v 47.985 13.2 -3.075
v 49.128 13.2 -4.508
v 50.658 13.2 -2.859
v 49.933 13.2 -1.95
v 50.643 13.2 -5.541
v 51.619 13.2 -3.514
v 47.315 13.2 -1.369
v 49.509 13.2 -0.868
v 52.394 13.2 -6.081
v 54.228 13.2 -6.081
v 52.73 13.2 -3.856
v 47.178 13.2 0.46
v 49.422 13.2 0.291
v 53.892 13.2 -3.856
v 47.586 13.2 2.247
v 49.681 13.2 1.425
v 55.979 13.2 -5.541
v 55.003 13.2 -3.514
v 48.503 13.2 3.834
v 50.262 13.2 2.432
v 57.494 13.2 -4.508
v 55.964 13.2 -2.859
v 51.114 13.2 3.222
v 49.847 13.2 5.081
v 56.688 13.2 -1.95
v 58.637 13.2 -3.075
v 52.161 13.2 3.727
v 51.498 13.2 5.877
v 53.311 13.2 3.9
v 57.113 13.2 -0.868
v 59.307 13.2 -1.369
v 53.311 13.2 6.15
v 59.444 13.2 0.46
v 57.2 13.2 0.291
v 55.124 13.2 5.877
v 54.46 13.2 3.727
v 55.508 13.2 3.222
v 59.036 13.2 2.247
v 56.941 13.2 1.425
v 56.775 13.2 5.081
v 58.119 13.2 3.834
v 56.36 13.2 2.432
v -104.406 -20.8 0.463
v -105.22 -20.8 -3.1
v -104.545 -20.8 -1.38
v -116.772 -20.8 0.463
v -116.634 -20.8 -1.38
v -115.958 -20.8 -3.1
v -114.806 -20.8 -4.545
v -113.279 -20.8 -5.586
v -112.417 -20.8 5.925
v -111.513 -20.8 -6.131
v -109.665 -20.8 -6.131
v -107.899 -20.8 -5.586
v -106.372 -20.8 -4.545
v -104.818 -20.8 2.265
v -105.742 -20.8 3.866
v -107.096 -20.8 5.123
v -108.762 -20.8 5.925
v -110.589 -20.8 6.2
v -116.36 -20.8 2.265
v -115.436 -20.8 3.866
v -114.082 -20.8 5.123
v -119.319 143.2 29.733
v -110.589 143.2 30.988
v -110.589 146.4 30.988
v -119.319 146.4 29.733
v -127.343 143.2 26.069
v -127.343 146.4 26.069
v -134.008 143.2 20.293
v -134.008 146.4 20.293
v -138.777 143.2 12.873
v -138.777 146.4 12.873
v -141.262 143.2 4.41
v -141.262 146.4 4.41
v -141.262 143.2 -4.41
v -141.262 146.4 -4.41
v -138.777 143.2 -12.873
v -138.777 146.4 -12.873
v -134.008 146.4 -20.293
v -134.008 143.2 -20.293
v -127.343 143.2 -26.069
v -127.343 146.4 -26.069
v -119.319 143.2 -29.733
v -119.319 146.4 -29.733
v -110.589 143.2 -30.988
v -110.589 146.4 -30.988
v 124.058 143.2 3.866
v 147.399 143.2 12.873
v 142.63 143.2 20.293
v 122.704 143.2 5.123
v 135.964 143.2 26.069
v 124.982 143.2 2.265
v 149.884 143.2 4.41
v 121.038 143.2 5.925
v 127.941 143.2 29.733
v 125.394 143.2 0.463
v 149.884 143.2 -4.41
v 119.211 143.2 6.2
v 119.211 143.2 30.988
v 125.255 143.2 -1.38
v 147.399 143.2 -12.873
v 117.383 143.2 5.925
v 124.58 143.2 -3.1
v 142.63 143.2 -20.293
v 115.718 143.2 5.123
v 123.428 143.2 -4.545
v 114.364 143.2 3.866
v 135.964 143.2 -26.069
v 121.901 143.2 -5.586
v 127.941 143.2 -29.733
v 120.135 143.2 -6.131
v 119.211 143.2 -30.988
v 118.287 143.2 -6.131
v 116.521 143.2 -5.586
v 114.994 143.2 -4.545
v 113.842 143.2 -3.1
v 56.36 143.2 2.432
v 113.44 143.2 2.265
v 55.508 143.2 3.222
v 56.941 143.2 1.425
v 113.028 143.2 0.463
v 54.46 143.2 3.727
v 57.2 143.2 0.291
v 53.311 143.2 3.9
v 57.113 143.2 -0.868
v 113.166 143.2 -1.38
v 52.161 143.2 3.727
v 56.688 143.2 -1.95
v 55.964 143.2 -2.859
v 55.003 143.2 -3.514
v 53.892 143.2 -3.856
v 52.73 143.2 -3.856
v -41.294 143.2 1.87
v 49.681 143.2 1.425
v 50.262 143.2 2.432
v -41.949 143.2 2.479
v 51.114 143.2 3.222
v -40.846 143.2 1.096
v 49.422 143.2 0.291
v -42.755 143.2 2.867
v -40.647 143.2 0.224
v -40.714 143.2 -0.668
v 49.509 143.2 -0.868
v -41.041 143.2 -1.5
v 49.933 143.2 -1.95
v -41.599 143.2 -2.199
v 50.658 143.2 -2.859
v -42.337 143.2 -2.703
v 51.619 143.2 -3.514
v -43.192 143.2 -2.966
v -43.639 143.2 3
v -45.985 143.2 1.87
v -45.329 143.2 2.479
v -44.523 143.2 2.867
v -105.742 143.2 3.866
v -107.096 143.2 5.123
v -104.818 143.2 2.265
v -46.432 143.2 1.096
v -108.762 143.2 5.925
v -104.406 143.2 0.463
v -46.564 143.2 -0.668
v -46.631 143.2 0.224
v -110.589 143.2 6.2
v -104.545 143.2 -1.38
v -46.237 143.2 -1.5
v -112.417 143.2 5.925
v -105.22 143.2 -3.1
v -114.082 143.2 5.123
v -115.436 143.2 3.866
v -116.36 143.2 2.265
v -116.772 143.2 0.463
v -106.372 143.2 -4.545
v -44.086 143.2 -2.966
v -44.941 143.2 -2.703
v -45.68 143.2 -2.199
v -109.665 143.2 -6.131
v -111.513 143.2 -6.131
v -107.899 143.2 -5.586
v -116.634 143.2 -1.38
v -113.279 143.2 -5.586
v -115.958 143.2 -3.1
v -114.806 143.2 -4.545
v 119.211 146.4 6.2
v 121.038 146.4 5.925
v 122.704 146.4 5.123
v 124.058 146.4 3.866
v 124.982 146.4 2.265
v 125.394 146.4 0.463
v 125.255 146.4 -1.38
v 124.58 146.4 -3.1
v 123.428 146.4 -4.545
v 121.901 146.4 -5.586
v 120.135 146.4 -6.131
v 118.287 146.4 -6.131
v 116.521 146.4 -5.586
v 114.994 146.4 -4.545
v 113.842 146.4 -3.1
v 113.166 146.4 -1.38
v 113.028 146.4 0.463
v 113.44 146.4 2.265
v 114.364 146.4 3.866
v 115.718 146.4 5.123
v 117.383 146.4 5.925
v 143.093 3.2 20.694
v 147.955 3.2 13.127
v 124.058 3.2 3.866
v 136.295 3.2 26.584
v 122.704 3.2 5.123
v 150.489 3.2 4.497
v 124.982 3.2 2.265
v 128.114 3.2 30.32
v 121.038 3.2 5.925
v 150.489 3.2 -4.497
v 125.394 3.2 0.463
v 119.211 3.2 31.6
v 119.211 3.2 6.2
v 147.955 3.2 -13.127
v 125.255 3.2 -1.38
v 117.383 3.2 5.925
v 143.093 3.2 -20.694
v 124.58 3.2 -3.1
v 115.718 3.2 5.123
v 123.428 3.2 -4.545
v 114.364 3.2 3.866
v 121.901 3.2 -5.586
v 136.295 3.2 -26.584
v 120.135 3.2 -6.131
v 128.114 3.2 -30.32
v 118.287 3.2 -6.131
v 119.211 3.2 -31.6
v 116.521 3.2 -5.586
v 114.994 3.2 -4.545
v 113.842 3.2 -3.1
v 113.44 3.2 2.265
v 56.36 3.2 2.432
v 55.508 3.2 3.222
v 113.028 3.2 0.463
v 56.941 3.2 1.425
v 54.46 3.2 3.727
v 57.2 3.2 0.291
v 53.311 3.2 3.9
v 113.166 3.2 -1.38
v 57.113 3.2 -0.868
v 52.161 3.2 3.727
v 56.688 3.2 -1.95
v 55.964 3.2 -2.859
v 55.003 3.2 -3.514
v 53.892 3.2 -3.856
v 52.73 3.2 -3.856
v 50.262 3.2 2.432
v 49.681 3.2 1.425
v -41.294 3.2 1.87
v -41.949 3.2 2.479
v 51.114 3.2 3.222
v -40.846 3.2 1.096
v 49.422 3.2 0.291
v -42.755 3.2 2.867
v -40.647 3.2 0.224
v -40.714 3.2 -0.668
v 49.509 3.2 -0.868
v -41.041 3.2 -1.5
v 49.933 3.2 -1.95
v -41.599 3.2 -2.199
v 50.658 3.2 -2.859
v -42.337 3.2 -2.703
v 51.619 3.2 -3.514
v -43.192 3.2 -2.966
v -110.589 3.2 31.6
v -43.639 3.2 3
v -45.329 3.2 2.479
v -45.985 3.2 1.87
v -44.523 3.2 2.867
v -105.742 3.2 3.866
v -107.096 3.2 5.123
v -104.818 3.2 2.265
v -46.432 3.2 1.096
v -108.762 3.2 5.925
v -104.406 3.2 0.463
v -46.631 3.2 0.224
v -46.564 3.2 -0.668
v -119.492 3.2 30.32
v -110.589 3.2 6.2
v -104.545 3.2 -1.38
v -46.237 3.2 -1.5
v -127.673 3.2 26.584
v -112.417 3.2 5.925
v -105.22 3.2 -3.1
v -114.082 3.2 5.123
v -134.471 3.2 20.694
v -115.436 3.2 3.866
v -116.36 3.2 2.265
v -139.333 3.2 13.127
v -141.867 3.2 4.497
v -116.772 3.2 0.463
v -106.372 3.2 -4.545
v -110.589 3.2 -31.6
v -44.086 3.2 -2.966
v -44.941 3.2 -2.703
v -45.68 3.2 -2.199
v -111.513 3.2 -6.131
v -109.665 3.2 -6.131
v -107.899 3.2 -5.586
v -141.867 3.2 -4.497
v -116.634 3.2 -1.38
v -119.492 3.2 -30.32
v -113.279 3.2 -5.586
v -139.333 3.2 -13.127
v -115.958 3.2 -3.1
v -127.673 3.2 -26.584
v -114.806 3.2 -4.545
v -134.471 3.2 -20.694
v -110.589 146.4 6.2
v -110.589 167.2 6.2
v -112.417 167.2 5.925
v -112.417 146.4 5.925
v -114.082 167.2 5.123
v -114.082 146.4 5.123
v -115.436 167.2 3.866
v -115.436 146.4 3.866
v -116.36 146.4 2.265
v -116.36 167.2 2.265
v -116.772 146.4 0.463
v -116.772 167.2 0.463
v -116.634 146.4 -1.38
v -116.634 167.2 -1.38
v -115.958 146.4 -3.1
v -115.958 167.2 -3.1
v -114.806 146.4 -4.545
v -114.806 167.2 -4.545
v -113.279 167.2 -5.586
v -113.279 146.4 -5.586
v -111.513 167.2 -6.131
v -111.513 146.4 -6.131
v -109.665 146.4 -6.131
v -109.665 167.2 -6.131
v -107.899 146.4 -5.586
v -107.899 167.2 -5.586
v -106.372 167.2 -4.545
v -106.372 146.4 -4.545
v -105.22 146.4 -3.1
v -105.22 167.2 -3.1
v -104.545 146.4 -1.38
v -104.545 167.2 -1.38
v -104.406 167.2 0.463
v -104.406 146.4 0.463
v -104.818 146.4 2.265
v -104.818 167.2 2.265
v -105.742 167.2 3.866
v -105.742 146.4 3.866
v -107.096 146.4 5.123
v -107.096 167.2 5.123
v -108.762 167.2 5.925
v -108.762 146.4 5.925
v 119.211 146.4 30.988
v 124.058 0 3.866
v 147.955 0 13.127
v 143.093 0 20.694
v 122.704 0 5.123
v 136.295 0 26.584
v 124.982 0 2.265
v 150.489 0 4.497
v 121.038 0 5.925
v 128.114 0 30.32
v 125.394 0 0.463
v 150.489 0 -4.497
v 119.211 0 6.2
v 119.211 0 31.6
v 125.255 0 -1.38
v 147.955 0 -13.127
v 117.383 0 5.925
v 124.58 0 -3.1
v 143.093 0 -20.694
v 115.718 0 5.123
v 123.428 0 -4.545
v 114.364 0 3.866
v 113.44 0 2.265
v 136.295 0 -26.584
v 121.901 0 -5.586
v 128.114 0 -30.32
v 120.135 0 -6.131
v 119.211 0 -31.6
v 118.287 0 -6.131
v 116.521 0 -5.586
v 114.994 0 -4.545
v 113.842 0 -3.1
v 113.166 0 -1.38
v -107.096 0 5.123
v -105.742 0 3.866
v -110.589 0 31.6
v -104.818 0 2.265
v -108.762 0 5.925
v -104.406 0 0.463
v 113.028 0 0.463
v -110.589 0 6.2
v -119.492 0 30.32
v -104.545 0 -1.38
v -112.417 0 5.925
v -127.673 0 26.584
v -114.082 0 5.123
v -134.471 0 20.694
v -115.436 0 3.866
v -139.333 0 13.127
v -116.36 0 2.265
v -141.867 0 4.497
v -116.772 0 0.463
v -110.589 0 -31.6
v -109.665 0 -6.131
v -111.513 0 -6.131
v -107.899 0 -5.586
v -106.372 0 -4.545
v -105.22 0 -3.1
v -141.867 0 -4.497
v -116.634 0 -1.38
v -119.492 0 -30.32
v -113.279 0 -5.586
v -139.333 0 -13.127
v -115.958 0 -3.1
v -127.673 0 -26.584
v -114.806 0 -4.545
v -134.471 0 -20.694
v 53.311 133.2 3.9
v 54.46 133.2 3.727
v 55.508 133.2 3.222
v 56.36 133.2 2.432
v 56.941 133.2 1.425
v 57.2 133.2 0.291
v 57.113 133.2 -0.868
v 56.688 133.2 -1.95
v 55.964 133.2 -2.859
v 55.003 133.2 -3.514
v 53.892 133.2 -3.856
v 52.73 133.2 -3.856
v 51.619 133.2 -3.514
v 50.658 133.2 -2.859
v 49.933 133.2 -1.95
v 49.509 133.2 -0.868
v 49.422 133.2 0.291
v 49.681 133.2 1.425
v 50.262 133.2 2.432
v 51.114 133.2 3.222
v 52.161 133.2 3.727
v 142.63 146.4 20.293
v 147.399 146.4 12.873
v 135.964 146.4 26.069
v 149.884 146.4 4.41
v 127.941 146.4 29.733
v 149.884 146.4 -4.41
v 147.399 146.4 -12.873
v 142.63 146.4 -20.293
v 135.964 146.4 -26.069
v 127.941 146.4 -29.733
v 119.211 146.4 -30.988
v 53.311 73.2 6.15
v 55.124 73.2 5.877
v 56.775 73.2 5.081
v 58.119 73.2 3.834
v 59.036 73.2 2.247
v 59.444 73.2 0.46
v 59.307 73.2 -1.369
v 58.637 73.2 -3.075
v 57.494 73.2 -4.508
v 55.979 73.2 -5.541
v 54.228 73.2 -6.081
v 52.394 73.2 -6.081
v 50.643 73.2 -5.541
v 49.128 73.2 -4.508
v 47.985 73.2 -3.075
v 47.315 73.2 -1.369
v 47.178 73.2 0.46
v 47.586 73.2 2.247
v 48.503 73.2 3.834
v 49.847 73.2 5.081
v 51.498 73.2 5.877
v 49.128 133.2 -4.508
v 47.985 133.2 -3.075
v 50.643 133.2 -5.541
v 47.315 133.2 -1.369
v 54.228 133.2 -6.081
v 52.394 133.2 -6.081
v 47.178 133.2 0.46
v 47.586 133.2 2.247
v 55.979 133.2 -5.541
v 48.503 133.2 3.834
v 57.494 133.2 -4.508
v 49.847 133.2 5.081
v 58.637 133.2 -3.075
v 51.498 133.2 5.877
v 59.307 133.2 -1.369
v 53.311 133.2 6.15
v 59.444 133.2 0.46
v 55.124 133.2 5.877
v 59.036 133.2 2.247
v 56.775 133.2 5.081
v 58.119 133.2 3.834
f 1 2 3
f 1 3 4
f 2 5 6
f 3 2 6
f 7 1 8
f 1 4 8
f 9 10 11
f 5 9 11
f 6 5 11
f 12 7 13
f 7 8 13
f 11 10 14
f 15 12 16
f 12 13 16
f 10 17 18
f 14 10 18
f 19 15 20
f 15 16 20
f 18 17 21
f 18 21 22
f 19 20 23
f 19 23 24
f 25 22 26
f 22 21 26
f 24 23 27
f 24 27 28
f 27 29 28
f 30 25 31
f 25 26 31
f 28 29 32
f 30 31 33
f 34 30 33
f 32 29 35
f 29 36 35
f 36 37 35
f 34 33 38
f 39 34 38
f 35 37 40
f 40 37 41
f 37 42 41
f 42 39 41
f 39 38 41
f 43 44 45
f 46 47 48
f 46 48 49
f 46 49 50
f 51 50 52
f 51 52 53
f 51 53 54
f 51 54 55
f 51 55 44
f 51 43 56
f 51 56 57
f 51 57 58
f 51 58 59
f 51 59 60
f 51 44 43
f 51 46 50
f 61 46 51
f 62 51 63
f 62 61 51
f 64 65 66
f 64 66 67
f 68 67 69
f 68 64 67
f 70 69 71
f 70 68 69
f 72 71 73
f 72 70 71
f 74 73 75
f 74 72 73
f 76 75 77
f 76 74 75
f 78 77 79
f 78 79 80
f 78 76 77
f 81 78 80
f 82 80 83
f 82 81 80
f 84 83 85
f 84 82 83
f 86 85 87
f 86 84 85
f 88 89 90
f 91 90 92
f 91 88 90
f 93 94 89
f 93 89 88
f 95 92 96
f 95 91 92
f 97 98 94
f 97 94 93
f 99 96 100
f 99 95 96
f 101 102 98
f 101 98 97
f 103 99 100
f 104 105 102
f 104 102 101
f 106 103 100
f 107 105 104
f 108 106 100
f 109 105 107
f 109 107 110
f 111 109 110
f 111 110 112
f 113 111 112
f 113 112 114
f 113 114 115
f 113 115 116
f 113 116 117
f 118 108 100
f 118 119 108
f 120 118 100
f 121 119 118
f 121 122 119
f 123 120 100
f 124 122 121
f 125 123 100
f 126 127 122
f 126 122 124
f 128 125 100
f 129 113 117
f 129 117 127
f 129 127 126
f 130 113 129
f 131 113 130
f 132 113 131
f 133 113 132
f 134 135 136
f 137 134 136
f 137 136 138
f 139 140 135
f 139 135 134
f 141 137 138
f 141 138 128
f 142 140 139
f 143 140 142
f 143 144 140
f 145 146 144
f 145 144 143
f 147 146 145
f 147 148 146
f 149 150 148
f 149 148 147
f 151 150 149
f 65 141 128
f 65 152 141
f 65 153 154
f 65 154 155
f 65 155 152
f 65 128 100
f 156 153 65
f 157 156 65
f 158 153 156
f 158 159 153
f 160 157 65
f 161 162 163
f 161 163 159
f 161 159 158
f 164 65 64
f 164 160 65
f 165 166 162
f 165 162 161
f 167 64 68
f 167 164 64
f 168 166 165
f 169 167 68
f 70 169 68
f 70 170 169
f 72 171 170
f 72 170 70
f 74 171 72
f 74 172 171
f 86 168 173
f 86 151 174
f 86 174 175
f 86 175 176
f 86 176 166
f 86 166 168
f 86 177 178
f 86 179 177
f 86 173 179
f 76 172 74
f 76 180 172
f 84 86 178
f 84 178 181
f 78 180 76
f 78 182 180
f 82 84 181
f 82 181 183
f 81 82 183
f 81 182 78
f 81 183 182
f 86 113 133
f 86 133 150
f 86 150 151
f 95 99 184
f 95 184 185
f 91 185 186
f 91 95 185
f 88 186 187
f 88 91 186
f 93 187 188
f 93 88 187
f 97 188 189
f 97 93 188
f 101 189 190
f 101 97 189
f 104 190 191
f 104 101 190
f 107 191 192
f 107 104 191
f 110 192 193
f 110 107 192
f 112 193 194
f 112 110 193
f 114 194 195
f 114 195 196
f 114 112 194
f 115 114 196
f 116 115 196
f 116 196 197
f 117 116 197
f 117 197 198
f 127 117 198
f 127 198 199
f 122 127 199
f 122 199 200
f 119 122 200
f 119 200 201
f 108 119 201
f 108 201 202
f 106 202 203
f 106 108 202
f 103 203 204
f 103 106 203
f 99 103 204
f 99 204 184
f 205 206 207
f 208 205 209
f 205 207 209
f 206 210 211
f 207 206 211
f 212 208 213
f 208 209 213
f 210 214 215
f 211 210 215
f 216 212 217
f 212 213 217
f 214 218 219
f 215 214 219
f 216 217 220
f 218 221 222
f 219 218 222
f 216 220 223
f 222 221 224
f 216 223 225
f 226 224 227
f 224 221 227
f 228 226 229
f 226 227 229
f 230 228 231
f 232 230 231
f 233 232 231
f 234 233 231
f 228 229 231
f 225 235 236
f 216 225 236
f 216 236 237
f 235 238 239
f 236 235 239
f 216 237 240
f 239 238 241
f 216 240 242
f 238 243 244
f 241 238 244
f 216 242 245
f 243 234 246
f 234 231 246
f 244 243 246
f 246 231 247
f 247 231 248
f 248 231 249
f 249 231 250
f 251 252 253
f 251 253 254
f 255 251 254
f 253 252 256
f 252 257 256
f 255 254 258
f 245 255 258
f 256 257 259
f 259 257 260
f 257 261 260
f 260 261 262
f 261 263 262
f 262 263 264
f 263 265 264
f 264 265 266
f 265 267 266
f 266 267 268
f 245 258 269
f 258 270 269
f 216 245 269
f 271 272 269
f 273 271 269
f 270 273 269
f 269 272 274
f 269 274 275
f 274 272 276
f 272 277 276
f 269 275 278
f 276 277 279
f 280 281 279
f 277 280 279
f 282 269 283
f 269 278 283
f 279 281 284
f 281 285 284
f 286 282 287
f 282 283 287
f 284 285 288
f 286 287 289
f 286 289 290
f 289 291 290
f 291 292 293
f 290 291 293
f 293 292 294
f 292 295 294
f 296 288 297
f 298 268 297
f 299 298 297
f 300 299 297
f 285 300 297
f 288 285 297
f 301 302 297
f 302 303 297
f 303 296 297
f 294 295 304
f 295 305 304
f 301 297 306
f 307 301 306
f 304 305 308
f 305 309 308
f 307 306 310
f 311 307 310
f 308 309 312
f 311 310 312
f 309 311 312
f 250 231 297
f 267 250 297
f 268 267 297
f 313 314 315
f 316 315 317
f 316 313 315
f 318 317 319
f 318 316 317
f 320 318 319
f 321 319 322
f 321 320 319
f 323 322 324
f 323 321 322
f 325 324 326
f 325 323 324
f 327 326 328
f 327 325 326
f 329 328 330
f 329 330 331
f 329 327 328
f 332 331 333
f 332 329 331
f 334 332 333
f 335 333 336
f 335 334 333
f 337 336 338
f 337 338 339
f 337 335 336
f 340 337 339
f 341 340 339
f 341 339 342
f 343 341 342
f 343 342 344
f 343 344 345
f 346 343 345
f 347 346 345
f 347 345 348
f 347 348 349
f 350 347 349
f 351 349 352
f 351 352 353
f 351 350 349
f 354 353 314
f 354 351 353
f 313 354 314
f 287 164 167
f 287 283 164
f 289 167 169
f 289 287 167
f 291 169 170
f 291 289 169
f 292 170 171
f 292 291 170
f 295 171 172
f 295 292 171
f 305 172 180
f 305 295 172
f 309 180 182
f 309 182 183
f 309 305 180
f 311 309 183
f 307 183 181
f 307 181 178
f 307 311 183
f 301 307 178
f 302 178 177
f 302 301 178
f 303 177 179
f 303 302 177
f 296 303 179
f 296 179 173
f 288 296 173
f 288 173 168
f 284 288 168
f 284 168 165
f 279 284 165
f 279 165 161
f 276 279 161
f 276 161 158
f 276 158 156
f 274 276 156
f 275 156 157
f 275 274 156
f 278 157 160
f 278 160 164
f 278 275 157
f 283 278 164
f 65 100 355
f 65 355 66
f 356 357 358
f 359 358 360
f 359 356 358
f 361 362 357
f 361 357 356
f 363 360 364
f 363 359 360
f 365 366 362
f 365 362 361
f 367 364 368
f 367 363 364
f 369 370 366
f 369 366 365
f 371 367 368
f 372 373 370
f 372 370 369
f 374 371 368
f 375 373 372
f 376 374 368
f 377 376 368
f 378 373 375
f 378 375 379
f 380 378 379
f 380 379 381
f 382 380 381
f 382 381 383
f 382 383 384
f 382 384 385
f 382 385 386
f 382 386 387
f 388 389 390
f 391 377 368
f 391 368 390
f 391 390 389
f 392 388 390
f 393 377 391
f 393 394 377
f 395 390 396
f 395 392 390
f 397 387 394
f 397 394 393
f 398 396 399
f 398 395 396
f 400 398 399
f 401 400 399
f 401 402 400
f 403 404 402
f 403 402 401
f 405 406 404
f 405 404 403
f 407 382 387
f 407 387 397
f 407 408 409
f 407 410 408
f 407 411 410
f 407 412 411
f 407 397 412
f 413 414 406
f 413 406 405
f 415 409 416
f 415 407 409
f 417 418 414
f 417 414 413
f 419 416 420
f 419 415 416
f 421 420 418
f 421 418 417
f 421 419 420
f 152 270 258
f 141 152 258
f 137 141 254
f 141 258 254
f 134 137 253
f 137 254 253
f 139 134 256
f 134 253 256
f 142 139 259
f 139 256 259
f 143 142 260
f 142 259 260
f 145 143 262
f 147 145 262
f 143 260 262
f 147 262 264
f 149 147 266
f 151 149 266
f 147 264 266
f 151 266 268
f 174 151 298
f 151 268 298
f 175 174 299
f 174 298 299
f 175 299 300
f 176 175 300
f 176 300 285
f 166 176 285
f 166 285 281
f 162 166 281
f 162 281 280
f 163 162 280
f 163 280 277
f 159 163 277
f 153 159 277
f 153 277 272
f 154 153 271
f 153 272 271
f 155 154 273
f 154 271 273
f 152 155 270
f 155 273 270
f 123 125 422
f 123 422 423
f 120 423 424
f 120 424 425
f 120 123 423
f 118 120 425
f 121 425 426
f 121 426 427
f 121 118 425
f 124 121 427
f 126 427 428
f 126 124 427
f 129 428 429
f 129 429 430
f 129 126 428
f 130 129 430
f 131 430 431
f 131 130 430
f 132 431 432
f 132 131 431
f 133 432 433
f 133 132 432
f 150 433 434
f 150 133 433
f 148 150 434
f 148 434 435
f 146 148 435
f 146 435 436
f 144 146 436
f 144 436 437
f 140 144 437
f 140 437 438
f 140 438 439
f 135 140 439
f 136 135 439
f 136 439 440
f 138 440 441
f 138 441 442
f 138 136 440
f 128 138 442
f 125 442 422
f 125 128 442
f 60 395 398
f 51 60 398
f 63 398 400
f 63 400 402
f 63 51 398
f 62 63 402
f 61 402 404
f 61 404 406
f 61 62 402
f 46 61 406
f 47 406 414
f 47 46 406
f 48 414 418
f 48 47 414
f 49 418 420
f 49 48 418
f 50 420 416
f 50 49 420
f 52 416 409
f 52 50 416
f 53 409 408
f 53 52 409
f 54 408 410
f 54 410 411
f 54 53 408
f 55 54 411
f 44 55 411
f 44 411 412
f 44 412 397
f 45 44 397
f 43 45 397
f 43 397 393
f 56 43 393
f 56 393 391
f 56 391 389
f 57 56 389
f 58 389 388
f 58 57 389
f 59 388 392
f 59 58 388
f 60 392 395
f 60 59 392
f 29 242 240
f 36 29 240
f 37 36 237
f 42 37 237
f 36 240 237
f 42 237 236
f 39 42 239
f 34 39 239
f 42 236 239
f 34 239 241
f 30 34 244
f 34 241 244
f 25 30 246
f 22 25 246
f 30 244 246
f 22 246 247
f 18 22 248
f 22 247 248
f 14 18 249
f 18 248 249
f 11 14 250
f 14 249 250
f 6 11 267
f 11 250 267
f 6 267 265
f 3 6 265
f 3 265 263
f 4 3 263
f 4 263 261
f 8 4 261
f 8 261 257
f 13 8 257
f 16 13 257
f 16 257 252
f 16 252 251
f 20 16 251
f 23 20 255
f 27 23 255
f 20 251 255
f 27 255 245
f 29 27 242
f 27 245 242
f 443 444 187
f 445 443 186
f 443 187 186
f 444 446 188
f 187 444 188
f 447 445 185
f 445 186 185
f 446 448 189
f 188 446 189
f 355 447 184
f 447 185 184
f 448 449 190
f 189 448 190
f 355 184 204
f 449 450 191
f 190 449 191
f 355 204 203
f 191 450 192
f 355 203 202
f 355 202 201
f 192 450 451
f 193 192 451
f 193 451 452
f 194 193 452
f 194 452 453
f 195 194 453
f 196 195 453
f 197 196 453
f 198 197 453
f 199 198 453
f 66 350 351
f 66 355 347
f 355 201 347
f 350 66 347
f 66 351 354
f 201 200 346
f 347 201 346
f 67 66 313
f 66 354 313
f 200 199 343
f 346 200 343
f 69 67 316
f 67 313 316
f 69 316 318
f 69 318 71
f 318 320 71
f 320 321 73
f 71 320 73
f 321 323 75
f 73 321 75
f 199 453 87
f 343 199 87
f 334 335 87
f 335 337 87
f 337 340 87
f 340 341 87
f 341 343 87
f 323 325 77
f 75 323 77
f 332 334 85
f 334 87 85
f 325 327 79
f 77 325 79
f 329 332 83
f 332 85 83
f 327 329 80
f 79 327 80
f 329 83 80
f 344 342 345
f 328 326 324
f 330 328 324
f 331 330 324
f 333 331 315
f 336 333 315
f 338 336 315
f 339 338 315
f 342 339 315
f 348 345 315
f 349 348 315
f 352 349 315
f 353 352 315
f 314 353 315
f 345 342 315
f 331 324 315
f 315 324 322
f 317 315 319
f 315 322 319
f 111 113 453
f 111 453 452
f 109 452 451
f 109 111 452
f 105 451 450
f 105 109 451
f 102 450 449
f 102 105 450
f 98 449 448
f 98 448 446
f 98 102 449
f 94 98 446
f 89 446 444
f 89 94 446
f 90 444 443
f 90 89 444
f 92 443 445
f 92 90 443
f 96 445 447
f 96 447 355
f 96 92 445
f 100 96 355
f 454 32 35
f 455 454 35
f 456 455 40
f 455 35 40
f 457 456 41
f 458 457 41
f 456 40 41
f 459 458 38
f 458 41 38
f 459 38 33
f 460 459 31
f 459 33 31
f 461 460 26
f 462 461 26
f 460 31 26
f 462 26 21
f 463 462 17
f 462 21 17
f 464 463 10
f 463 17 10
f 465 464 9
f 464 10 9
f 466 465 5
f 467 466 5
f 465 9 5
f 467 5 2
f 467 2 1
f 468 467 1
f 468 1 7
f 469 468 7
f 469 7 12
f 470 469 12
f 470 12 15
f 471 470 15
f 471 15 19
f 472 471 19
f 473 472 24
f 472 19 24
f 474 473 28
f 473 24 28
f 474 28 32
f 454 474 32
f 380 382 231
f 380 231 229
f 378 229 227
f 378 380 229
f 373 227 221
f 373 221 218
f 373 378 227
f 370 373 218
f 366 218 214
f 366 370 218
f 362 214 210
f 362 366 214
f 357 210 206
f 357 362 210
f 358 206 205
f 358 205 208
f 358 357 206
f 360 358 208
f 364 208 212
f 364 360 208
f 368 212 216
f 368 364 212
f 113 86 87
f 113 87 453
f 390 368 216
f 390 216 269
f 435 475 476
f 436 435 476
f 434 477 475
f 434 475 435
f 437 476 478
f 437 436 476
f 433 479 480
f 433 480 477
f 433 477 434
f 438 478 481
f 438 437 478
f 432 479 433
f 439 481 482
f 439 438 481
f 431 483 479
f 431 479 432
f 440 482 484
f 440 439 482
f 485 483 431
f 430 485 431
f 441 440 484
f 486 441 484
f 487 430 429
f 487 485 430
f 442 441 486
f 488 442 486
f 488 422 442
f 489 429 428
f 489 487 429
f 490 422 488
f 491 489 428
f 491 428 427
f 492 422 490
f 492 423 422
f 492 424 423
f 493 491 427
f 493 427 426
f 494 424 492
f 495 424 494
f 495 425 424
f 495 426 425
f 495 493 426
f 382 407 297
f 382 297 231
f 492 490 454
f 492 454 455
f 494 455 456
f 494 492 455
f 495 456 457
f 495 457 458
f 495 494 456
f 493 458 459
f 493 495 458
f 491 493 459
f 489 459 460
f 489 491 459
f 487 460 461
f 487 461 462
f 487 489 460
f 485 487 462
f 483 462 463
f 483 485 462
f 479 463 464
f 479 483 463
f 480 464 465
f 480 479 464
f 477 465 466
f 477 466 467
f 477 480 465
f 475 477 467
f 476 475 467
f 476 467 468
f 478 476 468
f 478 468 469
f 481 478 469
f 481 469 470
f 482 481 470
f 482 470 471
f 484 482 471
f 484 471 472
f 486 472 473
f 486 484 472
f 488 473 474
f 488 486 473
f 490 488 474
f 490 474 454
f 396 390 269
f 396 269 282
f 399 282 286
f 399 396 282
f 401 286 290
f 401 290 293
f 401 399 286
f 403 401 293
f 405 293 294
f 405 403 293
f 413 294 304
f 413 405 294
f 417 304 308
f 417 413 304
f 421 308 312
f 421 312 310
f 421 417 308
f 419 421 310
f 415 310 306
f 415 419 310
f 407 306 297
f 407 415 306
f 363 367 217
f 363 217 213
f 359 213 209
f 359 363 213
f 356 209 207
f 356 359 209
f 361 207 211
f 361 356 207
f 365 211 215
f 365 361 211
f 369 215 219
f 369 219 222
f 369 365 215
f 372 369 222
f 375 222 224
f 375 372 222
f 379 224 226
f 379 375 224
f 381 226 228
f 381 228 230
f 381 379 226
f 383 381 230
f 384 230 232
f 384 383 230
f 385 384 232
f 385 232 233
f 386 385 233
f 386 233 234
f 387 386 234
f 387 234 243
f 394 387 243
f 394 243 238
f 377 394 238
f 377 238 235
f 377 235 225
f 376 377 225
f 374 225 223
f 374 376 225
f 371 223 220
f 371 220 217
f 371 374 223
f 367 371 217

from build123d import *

# Parameters (mm, degrees)
SKETCH1_R            = 6.2
BOSS_EXTRUDE1_DEPTH  = 3.2
SKETCH8_R            = 6.15
BOSS_EXTRUDE5_DEPTH  = 140
SKETCH11_R           = 6.2
BOSS_EXTRUDE6_DEPTH  = 3.2
SKETCH12_R           = 3
BOSS_EXTRUDE7_DEPTH  = 140
SKETCH14_R           = 3.9
BOSS_EXTRUDE8_DEPTH  = 10
SKETCH15_R           = 6.15
BOSS_EXTRUDE9_DEPTH  = 60
SKETCH16_R           = 6.2
BOSS_EXTRUDE10_DEPTH = 94


with BuildPart() as part:
    # Sketch1 → Boss-Extrude1 (new body)
    with BuildSketch(Plane(origin=(0, 0, 0), x_dir=(1, 0, 0), z_dir=(0, 1, 0))):
        with BuildLine():
            Line((-110.589063221, 31.6), (119.210936779, 31.6))
            ThreePointArc((119.210936779, 31.6), (150.810936779, 0), (119.210936779, -31.6))
            Line((119.210936779, -31.6), (-110.589063221, -31.6))
            ThreePointArc((-110.589063221, -31.6), (-142.189063221, 0), (-110.589063221, 31.6))
        make_face()
        with Locations(Location((119.210936779, 0, 0), (0, 0, 270))):
            Circle(SKETCH1_R, mode=Mode.SUBTRACT)
    extrude(amount=BOSS_EXTRUDE1_DEPTH)

    # Sketch8 → Boss-Extrude5 (add)
    with BuildSketch(Plane(origin=(0, 3.2, 0), x_dir=(1, 0, 0), z_dir=(0, 1, 0))):
        with Locations(Location((-110.589063221, 0, 0), (0, 0, 270))):
            Circle(SKETCH8_R)
    extrude(amount=BOSS_EXTRUDE5_DEPTH)

    # Sketch11 → Boss-Extrude6 (add)
    with BuildSketch(Plane(origin=(0, 143.2, 0), x_dir=(1, 0, 0), z_dir=(0, 1, 0))):
        with BuildLine():
            Line((-110.589063221, 30.988193708), (119.210936779, 30.988193708))
            ThreePointArc((119.210936779, 30.988193708), (150.199130487, 0), (119.210936779, -30.988193708))
            Line((119.210936779, -30.988193708), (-110.589063221, -30.988193708))
            ThreePointArc((-110.589063221, -30.988193708), (-141.577256929, 0), (-110.589063221, 30.988193708))
        make_face()
        with Locations(Location((119.210936779, 0, 0), (0, 0, 270))):
            Circle(SKETCH11_R, mode=Mode.SUBTRACT)
    extrude(amount=BOSS_EXTRUDE6_DEPTH)

    # Sketch12 → Boss-Extrude7 (add)
    with BuildSketch(Plane(origin=(0, 3.2, 0), x_dir=(1, 0, 0), z_dir=(0, 1, 0))):
        with Locations(Location((-43.639063221, 0, 0), (0, 0, 270))):
            Circle(SKETCH12_R)
    extrude(amount=BOSS_EXTRUDE7_DEPTH)

    # Sketch14 → Boss-Extrude8 (add)
    with BuildSketch(Plane(origin=(0, 3.2, 0), x_dir=(1, 0, 0), z_dir=(0, 1, 0))):
        with Locations(Location((53.310936779, 0, 0), (0, 0, 270))):
            Circle(SKETCH14_R)
    boss_extrude8 = extrude(amount=BOSS_EXTRUDE8_DEPTH)

    # Sketch15 → Boss-Extrude9 (add)
    with BuildSketch(Plane(origin=(0, 13.2, 0), x_dir=(1, 0, 0), z_dir=(0, 1, 0))):
        with Locations(Location((53.310936779, 0, 0), (0, 0, 270))):
            Circle(SKETCH15_R)
    boss_extrude9 = extrude(amount=BOSS_EXTRUDE9_DEPTH)

    # Mirror7: Boss-Extrude8, Boss-Extrude9 across plane
    add(boss_extrude8.mirror(Plane.ZX.offset(73.2)))
    add(boss_extrude9.mirror(Plane.ZX.offset(73.2)))

    # Sketch16 → Boss-Extrude10 (add, symmetric)
    with BuildSketch(Plane(origin=(0, 73.2, 0), x_dir=(-1, 0, 0), z_dir=(0, -1, 0))):
        with Locations(Location((110.589063221, 0, 0), (0, 0, 270))):
            Circle(SKETCH16_R)
    extrude(amount=BOSS_EXTRUDE10_DEPTH, both=True)


solid = part.part
